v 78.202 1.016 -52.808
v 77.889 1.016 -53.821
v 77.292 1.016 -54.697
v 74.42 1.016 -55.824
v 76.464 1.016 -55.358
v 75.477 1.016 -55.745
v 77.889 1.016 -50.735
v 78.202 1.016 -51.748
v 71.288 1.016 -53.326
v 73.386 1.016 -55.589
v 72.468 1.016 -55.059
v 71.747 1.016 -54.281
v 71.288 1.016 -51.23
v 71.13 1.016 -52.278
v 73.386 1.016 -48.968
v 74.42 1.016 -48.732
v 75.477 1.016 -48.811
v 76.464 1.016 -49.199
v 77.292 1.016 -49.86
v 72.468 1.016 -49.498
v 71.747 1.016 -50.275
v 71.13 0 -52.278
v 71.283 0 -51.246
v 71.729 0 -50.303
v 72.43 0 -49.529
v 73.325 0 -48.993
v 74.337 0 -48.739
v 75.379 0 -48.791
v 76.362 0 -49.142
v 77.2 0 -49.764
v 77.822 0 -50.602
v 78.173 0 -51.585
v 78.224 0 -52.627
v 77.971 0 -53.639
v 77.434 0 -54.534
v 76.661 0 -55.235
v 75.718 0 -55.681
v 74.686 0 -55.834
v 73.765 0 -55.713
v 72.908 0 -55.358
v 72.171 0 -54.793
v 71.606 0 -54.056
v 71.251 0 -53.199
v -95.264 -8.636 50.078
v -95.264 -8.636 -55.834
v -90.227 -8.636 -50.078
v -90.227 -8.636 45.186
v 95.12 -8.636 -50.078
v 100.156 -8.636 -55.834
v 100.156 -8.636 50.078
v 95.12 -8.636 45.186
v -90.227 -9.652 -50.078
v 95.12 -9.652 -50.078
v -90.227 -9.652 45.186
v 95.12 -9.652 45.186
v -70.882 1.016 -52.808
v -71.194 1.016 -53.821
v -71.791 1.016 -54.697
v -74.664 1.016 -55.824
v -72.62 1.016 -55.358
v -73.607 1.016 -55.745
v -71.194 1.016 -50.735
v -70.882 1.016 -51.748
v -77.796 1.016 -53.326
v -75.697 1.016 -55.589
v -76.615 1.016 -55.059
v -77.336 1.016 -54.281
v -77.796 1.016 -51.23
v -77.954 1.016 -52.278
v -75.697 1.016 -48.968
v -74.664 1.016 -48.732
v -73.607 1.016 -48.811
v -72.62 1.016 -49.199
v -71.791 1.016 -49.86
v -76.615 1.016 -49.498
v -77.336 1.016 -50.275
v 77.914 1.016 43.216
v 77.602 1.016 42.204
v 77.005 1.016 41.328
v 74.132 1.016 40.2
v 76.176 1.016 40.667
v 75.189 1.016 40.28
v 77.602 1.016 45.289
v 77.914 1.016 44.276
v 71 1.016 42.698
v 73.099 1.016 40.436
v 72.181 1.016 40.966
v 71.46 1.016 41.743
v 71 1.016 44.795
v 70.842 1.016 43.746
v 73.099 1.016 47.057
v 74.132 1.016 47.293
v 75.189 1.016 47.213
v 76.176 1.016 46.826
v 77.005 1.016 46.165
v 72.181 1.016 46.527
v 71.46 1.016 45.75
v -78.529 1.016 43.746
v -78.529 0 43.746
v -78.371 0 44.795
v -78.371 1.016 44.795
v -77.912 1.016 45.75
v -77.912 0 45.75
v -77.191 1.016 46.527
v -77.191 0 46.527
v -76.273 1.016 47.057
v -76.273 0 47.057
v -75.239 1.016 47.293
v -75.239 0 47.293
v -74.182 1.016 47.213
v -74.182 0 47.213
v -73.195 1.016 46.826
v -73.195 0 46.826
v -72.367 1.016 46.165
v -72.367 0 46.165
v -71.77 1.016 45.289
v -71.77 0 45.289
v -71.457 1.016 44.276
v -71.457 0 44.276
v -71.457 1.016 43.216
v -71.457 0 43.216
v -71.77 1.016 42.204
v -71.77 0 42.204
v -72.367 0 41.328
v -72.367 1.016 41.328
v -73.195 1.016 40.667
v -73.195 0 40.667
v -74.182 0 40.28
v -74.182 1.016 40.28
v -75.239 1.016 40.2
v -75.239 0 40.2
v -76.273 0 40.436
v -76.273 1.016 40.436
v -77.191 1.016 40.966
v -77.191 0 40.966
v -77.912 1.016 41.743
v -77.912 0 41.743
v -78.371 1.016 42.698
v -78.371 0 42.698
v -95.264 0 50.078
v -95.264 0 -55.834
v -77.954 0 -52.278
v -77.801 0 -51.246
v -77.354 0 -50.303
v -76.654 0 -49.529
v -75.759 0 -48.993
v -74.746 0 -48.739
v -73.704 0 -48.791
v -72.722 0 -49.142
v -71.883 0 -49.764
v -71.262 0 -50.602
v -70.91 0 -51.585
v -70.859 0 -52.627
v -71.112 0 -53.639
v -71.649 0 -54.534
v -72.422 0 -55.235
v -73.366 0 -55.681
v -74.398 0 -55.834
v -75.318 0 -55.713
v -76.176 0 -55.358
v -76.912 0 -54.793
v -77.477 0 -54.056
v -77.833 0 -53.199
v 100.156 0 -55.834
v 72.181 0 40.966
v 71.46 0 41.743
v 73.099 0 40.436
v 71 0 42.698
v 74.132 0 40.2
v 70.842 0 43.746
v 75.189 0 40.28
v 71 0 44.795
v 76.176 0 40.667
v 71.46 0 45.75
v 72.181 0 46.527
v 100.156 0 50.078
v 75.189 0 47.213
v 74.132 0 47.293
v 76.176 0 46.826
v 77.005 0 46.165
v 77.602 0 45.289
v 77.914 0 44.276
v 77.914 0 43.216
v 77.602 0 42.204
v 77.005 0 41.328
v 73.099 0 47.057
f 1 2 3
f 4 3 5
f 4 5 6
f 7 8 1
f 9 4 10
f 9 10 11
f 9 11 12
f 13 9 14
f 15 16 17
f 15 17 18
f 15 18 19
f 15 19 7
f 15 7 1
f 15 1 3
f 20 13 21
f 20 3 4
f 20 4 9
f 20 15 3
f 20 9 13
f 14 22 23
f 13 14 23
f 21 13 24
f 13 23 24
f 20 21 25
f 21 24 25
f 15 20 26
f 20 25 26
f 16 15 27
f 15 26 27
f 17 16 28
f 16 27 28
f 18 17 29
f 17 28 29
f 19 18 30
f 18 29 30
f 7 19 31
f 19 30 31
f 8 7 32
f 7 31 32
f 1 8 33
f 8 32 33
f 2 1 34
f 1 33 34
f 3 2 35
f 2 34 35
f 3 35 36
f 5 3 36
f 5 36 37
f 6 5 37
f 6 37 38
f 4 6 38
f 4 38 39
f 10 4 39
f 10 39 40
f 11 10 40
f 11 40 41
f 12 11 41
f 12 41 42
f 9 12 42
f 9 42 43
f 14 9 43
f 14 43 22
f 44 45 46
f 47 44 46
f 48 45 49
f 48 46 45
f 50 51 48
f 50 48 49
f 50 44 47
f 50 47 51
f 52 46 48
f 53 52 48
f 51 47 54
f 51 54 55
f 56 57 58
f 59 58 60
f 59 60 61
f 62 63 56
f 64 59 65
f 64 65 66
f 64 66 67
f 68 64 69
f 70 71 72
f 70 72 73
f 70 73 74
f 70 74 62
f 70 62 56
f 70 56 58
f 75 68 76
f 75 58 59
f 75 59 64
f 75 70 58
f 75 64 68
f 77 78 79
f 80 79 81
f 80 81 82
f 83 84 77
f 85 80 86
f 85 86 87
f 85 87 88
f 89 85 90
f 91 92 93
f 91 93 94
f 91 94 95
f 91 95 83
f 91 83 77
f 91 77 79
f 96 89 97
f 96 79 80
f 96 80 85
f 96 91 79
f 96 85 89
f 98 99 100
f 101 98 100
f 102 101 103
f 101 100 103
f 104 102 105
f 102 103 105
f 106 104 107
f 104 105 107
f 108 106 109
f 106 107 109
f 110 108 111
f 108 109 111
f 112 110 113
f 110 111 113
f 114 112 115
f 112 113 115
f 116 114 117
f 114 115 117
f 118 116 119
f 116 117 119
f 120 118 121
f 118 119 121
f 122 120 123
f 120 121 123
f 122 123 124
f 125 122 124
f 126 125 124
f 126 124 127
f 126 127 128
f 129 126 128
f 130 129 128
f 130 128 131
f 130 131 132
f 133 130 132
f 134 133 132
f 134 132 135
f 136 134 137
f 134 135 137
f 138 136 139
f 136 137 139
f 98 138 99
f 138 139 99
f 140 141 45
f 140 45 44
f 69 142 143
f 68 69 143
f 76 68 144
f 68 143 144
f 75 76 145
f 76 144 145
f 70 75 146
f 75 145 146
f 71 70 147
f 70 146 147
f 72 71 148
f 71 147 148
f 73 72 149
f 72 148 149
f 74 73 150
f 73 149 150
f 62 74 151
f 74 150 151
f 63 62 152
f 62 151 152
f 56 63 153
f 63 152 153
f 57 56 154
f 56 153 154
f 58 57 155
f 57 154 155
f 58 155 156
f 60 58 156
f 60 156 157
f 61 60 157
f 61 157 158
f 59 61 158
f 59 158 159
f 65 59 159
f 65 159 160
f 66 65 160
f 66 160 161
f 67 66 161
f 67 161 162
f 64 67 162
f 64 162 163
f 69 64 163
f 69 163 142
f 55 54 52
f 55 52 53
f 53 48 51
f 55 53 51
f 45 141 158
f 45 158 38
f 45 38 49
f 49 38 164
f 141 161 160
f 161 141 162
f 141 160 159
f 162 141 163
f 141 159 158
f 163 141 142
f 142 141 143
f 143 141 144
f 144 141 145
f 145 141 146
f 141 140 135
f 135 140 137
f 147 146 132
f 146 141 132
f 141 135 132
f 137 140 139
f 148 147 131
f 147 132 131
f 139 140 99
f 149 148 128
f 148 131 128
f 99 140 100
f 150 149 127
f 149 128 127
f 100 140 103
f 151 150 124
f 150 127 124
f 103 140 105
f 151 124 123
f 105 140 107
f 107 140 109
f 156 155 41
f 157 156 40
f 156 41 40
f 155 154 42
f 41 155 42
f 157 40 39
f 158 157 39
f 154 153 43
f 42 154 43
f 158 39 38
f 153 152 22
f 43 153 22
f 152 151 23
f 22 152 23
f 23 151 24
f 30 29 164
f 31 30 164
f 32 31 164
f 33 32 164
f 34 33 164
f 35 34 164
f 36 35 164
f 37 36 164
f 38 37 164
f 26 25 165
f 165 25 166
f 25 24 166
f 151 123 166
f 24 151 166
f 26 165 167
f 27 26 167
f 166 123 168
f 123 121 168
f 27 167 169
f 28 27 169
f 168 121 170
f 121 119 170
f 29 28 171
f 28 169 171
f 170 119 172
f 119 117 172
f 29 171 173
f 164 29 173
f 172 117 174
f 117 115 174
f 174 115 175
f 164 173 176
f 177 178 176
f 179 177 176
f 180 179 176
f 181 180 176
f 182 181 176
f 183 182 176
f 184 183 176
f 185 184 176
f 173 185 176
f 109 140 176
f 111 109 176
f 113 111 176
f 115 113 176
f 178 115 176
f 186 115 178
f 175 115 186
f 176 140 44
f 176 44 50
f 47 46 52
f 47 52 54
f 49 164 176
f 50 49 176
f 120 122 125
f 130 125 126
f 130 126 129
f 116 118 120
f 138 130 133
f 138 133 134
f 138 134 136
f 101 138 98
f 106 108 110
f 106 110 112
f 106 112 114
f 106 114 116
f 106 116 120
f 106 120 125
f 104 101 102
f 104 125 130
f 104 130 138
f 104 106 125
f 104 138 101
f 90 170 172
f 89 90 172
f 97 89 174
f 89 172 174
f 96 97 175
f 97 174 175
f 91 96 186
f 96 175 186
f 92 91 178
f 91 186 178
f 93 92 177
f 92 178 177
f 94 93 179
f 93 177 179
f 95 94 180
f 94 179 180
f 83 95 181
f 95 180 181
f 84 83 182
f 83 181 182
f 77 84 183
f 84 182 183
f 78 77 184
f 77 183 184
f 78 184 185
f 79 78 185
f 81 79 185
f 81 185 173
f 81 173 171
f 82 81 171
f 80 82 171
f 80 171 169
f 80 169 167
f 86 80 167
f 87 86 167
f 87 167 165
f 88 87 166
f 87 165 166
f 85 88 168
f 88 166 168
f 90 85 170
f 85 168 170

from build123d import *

# Parameters (mm, degrees)
F0_W     = 195.4201161861
F0_H     = 105.9125140309
F1_DEPTH = 8.636
F2_W     = 185.3469088674
F2_H     = 95.2637046576
F3_DEPTH = 1.016
F4_R     = 3.556
F5_DEPTH = 1.016


# Not quite as in the source:
# - a feature names something its author has since deleted; it is built from what else it names


with BuildPart() as f1:
    # F0 (on Front) → F1 (new body)
    with BuildSketch(Plane.XZ):
        with Locations((2.4463534355, -2.8780587018)):
            Rectangle(F0_W, F0_H)
    extrude(amount=F1_DEPTH)

    # F2 (on face) → F3 (join)
    with BuildSketch(Plane.XZ.offset(8.636)):
        with Locations((2.4463497102, -2.4463459849)):
            Rectangle(F2_W, F2_H)
    extrude(amount=F3_DEPTH)

    # F4 (on face) → F5 (join)
    with BuildSketch(Plane(origin=(0, 0, 0), x_dir=(-1, 0, 0), z_dir=(0, 1, 0))):
        with Locations((-74.3977949023, 43.7464751303)):
            Circle(F4_R)
        with Locations((-74.6855959296, -52.2783157172)):
            Circle(F4_R)
        with Locations((74.3977874517, -52.2783157172)):
            Circle(F4_R)
        with Locations((74.9733969569, 43.7464751303)):
            Circle(F4_R)
    extrude(amount=F5_DEPTH)


solid = f1.part
